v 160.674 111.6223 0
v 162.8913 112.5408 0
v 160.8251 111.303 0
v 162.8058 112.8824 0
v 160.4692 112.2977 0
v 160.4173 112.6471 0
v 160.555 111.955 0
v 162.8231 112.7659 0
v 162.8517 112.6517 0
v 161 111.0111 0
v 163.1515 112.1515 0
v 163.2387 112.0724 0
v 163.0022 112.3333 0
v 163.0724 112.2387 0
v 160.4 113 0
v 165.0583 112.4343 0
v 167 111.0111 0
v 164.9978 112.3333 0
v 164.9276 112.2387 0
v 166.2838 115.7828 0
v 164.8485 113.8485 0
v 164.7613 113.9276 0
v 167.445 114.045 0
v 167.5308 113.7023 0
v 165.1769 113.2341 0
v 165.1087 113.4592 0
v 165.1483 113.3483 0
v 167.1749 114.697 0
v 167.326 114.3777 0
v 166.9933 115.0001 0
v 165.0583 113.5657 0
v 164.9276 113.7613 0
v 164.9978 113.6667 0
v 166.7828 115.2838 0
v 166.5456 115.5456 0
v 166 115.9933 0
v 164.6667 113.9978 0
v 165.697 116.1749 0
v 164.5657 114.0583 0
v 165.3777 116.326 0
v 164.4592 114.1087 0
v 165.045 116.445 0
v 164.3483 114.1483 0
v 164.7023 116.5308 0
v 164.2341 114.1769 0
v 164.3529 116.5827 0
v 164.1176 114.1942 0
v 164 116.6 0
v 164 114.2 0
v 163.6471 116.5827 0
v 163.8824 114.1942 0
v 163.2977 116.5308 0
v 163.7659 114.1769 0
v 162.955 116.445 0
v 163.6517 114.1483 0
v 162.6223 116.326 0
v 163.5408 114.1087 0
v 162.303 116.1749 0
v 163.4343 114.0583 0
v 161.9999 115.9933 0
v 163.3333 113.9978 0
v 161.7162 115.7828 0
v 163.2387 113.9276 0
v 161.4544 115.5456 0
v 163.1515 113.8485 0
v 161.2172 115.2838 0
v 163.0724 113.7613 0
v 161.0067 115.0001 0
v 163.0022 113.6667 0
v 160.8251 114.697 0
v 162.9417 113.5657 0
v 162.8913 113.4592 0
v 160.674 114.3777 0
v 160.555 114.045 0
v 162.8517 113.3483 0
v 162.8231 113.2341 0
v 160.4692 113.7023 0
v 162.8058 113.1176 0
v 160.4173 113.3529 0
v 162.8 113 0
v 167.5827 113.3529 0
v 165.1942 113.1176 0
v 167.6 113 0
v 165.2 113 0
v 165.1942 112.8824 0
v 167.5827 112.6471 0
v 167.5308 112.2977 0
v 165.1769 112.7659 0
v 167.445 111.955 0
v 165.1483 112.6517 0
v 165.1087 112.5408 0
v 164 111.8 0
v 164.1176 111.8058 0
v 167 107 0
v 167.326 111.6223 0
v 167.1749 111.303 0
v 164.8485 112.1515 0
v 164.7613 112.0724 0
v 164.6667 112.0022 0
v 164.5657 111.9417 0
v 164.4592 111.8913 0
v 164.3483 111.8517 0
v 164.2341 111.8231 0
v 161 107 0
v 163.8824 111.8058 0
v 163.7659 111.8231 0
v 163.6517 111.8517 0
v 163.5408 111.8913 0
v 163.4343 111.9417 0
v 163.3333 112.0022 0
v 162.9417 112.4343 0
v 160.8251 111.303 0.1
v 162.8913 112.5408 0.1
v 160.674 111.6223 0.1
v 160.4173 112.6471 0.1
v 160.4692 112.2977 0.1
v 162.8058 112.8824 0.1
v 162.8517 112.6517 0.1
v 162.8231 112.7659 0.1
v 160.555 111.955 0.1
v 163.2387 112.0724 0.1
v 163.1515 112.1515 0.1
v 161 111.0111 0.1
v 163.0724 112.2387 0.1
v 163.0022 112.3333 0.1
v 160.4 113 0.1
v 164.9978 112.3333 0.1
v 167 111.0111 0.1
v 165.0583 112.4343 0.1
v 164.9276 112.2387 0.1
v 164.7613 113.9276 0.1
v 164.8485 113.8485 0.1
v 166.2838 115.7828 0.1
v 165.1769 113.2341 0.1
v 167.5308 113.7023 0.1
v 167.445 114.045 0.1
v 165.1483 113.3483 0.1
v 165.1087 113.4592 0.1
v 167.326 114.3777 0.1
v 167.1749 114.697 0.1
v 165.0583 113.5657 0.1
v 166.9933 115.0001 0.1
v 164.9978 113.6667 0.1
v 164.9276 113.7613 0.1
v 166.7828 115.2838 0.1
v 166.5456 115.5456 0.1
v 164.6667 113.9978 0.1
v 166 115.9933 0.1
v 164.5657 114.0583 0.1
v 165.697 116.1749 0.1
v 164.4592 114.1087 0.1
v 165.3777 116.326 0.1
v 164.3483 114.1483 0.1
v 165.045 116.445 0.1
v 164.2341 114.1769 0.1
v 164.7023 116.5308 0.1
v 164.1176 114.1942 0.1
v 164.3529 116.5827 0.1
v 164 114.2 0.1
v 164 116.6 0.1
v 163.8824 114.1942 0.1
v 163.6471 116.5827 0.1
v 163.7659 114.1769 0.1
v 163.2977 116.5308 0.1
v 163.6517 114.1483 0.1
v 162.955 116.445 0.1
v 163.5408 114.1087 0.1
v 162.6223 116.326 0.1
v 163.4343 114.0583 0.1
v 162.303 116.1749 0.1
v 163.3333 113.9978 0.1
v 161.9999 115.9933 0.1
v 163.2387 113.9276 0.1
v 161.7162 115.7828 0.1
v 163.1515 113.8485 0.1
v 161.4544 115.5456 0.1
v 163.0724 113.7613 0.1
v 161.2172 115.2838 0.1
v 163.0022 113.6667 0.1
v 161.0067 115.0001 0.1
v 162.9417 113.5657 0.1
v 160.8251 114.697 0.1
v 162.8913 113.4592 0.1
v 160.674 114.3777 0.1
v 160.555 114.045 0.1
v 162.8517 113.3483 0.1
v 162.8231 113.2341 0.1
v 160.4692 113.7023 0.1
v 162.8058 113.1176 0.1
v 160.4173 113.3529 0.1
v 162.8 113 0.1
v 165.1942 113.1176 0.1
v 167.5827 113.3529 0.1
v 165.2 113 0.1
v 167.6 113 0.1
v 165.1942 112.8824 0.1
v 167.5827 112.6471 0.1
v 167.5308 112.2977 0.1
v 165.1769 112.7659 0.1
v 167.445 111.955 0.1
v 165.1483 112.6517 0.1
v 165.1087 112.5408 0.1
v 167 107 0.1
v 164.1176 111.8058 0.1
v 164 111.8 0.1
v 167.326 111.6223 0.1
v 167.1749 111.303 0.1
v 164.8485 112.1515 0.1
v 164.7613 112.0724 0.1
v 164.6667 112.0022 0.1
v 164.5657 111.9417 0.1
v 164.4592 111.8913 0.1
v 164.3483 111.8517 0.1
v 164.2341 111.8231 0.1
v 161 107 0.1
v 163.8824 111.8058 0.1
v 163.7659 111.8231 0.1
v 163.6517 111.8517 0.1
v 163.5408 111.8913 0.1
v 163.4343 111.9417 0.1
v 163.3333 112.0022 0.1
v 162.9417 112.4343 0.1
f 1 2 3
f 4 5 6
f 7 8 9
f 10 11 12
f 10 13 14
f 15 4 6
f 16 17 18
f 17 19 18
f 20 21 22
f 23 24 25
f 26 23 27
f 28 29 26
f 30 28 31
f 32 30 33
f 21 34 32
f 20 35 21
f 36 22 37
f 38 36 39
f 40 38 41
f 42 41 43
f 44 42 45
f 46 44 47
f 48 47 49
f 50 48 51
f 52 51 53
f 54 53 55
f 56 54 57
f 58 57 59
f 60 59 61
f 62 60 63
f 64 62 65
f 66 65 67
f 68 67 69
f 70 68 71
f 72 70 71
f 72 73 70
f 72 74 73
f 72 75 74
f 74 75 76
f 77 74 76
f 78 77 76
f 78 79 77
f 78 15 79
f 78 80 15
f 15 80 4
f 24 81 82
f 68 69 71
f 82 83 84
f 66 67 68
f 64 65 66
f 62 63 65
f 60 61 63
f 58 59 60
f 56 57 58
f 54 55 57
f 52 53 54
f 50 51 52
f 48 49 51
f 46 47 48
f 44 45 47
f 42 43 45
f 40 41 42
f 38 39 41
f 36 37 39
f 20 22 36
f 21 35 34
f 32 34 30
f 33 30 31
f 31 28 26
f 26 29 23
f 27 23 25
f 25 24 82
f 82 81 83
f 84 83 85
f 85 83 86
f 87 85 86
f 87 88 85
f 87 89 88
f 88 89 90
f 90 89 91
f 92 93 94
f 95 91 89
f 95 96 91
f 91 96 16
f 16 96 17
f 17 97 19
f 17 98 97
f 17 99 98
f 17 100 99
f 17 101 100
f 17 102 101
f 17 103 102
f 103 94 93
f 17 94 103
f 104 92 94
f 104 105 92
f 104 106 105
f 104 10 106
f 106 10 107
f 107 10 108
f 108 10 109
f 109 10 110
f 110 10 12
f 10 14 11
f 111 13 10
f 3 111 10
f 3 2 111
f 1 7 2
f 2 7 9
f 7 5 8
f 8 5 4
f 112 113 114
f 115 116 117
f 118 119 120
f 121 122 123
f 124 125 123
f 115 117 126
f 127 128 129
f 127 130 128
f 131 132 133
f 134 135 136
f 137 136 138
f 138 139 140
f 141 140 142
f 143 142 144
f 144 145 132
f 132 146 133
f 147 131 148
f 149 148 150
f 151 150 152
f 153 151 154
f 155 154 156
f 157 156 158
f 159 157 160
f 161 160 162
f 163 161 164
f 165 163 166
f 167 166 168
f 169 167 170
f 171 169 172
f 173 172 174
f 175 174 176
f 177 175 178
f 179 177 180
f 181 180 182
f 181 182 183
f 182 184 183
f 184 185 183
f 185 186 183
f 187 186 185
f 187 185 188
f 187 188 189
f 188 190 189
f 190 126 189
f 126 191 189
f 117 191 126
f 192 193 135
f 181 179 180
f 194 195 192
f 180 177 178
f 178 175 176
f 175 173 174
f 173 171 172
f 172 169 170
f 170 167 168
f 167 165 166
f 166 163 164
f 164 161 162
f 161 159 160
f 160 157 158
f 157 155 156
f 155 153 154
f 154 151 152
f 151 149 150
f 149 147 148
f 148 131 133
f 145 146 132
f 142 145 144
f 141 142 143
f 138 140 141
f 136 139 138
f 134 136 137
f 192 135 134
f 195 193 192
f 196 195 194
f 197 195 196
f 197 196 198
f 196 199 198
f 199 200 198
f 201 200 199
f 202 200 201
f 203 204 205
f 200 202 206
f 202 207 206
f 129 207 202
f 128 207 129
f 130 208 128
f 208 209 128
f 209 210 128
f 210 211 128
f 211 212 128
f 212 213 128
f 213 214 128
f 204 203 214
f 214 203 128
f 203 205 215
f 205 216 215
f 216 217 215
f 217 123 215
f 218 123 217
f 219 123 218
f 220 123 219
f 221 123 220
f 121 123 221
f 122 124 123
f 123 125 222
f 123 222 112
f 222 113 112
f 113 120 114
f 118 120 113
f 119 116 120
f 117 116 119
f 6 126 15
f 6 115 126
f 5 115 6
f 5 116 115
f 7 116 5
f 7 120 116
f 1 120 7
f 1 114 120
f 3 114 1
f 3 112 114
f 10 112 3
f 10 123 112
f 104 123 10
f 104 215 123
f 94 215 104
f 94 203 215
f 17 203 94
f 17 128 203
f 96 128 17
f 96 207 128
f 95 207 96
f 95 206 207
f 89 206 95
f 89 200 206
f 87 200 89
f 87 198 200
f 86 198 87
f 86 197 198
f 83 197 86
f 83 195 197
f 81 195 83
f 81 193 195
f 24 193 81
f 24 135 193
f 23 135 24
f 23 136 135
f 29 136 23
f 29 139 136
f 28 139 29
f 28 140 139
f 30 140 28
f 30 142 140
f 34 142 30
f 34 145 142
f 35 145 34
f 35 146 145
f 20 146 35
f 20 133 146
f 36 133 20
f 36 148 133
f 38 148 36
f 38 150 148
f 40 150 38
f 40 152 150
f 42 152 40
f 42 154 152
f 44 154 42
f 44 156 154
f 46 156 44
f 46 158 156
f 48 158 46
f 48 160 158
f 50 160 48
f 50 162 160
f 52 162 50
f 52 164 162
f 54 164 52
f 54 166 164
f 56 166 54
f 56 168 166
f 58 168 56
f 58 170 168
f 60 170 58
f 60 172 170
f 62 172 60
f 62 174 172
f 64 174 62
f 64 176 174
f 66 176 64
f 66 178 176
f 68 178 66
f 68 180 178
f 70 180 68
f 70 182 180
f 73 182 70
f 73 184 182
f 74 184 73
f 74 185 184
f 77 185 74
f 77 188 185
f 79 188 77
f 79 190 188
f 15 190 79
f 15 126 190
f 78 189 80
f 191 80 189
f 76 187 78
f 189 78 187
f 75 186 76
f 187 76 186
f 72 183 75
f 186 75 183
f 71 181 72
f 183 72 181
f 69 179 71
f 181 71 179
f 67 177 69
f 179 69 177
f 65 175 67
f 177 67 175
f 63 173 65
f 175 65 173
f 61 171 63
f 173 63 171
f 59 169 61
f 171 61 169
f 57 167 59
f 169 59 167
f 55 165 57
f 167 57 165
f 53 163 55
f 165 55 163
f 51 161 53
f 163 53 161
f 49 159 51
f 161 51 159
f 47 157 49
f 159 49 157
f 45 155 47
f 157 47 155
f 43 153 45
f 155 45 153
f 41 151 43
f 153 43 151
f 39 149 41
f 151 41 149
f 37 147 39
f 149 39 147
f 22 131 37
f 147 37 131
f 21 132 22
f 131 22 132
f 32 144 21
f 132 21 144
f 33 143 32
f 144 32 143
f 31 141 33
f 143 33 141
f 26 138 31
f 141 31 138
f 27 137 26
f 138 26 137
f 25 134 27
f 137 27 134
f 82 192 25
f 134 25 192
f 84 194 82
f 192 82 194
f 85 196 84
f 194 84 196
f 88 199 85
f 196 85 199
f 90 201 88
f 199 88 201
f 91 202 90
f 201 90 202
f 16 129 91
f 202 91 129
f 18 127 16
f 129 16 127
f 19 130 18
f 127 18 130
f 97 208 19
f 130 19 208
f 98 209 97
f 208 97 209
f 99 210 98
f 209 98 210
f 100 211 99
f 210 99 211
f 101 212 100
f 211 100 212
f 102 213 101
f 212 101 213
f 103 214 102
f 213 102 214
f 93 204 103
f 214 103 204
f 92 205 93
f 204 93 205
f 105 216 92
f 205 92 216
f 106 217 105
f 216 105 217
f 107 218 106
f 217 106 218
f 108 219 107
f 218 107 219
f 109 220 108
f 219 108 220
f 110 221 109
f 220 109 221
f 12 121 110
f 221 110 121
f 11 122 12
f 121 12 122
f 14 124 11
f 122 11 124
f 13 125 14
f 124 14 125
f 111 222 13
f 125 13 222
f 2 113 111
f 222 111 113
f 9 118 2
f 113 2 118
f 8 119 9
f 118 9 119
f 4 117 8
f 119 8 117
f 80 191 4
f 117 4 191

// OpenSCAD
// file: support.scad
// Receiving-box cradle study: does not invent JST bearing or latch details.
module touch_cradle(){difference(){union(){
 translate([164,113,9.5])cylinder(d=7.2,h=11,$fn=64);
 translate([161,108.4,9.5])cube([6,4.6,3]);
 // Positive edge key with nominal0.1 mm edge gap; copper keepout unresolved.
 translate([161,107,7.7])cube([6,1.4,4.8]);
 hull(){translate([164,113,18.5])cylinder(d=5,h=2,$fn=32);translate([177.5,116,18.5])cylinder(d=5,h=2,$fn=32);}
 translate([172,113.5,20])cube([11,23,1.5]);
 translate([170.5,113.5,20])cube([1.5,9,4.5]);translate([183,113.5,20])cube([1.5,9,4.5]);
 }
 translate([164,113,9.4])cylinder(d=2.4,h=11.3,$fn=64);
 translate([164,113,12.5])cylinder(d=5.4,h=8.2,$fn=64);
 // Strap passes below body via two vertical slots alongside the box.
 translate([170.7,118.4,19.9])cube([1.3,3.2,4.8]);translate([183,118.4,19.9])cube([1.3,3.2,4.8]);
}}
// Loose T18R receiving reservation only, reusing r9 measured-part conditions.
module touch_cradle_strap(){union(){difference(){translate([170.8,118.75,18.8])cube([13.4,2.5,14.8]);translate([171.9,118.65,19.9])cube([11.2,2.7,12.6]);}translate([180.1,117.25,15.4])cube([5.5,5.5,3.4]);}}
module touch_cradle_candidate(){touch_cradle();touch_cradle_strap();}
// main file
use <support.scad>
// Positive footprint slice immediately above the seating plane. Raw coplanar
// Boolean output is not guaranteed to contain the whole contact face.
linear_extrude(.1)projection(cut=true)translate([0,0,-9.501])touch_cradle();
